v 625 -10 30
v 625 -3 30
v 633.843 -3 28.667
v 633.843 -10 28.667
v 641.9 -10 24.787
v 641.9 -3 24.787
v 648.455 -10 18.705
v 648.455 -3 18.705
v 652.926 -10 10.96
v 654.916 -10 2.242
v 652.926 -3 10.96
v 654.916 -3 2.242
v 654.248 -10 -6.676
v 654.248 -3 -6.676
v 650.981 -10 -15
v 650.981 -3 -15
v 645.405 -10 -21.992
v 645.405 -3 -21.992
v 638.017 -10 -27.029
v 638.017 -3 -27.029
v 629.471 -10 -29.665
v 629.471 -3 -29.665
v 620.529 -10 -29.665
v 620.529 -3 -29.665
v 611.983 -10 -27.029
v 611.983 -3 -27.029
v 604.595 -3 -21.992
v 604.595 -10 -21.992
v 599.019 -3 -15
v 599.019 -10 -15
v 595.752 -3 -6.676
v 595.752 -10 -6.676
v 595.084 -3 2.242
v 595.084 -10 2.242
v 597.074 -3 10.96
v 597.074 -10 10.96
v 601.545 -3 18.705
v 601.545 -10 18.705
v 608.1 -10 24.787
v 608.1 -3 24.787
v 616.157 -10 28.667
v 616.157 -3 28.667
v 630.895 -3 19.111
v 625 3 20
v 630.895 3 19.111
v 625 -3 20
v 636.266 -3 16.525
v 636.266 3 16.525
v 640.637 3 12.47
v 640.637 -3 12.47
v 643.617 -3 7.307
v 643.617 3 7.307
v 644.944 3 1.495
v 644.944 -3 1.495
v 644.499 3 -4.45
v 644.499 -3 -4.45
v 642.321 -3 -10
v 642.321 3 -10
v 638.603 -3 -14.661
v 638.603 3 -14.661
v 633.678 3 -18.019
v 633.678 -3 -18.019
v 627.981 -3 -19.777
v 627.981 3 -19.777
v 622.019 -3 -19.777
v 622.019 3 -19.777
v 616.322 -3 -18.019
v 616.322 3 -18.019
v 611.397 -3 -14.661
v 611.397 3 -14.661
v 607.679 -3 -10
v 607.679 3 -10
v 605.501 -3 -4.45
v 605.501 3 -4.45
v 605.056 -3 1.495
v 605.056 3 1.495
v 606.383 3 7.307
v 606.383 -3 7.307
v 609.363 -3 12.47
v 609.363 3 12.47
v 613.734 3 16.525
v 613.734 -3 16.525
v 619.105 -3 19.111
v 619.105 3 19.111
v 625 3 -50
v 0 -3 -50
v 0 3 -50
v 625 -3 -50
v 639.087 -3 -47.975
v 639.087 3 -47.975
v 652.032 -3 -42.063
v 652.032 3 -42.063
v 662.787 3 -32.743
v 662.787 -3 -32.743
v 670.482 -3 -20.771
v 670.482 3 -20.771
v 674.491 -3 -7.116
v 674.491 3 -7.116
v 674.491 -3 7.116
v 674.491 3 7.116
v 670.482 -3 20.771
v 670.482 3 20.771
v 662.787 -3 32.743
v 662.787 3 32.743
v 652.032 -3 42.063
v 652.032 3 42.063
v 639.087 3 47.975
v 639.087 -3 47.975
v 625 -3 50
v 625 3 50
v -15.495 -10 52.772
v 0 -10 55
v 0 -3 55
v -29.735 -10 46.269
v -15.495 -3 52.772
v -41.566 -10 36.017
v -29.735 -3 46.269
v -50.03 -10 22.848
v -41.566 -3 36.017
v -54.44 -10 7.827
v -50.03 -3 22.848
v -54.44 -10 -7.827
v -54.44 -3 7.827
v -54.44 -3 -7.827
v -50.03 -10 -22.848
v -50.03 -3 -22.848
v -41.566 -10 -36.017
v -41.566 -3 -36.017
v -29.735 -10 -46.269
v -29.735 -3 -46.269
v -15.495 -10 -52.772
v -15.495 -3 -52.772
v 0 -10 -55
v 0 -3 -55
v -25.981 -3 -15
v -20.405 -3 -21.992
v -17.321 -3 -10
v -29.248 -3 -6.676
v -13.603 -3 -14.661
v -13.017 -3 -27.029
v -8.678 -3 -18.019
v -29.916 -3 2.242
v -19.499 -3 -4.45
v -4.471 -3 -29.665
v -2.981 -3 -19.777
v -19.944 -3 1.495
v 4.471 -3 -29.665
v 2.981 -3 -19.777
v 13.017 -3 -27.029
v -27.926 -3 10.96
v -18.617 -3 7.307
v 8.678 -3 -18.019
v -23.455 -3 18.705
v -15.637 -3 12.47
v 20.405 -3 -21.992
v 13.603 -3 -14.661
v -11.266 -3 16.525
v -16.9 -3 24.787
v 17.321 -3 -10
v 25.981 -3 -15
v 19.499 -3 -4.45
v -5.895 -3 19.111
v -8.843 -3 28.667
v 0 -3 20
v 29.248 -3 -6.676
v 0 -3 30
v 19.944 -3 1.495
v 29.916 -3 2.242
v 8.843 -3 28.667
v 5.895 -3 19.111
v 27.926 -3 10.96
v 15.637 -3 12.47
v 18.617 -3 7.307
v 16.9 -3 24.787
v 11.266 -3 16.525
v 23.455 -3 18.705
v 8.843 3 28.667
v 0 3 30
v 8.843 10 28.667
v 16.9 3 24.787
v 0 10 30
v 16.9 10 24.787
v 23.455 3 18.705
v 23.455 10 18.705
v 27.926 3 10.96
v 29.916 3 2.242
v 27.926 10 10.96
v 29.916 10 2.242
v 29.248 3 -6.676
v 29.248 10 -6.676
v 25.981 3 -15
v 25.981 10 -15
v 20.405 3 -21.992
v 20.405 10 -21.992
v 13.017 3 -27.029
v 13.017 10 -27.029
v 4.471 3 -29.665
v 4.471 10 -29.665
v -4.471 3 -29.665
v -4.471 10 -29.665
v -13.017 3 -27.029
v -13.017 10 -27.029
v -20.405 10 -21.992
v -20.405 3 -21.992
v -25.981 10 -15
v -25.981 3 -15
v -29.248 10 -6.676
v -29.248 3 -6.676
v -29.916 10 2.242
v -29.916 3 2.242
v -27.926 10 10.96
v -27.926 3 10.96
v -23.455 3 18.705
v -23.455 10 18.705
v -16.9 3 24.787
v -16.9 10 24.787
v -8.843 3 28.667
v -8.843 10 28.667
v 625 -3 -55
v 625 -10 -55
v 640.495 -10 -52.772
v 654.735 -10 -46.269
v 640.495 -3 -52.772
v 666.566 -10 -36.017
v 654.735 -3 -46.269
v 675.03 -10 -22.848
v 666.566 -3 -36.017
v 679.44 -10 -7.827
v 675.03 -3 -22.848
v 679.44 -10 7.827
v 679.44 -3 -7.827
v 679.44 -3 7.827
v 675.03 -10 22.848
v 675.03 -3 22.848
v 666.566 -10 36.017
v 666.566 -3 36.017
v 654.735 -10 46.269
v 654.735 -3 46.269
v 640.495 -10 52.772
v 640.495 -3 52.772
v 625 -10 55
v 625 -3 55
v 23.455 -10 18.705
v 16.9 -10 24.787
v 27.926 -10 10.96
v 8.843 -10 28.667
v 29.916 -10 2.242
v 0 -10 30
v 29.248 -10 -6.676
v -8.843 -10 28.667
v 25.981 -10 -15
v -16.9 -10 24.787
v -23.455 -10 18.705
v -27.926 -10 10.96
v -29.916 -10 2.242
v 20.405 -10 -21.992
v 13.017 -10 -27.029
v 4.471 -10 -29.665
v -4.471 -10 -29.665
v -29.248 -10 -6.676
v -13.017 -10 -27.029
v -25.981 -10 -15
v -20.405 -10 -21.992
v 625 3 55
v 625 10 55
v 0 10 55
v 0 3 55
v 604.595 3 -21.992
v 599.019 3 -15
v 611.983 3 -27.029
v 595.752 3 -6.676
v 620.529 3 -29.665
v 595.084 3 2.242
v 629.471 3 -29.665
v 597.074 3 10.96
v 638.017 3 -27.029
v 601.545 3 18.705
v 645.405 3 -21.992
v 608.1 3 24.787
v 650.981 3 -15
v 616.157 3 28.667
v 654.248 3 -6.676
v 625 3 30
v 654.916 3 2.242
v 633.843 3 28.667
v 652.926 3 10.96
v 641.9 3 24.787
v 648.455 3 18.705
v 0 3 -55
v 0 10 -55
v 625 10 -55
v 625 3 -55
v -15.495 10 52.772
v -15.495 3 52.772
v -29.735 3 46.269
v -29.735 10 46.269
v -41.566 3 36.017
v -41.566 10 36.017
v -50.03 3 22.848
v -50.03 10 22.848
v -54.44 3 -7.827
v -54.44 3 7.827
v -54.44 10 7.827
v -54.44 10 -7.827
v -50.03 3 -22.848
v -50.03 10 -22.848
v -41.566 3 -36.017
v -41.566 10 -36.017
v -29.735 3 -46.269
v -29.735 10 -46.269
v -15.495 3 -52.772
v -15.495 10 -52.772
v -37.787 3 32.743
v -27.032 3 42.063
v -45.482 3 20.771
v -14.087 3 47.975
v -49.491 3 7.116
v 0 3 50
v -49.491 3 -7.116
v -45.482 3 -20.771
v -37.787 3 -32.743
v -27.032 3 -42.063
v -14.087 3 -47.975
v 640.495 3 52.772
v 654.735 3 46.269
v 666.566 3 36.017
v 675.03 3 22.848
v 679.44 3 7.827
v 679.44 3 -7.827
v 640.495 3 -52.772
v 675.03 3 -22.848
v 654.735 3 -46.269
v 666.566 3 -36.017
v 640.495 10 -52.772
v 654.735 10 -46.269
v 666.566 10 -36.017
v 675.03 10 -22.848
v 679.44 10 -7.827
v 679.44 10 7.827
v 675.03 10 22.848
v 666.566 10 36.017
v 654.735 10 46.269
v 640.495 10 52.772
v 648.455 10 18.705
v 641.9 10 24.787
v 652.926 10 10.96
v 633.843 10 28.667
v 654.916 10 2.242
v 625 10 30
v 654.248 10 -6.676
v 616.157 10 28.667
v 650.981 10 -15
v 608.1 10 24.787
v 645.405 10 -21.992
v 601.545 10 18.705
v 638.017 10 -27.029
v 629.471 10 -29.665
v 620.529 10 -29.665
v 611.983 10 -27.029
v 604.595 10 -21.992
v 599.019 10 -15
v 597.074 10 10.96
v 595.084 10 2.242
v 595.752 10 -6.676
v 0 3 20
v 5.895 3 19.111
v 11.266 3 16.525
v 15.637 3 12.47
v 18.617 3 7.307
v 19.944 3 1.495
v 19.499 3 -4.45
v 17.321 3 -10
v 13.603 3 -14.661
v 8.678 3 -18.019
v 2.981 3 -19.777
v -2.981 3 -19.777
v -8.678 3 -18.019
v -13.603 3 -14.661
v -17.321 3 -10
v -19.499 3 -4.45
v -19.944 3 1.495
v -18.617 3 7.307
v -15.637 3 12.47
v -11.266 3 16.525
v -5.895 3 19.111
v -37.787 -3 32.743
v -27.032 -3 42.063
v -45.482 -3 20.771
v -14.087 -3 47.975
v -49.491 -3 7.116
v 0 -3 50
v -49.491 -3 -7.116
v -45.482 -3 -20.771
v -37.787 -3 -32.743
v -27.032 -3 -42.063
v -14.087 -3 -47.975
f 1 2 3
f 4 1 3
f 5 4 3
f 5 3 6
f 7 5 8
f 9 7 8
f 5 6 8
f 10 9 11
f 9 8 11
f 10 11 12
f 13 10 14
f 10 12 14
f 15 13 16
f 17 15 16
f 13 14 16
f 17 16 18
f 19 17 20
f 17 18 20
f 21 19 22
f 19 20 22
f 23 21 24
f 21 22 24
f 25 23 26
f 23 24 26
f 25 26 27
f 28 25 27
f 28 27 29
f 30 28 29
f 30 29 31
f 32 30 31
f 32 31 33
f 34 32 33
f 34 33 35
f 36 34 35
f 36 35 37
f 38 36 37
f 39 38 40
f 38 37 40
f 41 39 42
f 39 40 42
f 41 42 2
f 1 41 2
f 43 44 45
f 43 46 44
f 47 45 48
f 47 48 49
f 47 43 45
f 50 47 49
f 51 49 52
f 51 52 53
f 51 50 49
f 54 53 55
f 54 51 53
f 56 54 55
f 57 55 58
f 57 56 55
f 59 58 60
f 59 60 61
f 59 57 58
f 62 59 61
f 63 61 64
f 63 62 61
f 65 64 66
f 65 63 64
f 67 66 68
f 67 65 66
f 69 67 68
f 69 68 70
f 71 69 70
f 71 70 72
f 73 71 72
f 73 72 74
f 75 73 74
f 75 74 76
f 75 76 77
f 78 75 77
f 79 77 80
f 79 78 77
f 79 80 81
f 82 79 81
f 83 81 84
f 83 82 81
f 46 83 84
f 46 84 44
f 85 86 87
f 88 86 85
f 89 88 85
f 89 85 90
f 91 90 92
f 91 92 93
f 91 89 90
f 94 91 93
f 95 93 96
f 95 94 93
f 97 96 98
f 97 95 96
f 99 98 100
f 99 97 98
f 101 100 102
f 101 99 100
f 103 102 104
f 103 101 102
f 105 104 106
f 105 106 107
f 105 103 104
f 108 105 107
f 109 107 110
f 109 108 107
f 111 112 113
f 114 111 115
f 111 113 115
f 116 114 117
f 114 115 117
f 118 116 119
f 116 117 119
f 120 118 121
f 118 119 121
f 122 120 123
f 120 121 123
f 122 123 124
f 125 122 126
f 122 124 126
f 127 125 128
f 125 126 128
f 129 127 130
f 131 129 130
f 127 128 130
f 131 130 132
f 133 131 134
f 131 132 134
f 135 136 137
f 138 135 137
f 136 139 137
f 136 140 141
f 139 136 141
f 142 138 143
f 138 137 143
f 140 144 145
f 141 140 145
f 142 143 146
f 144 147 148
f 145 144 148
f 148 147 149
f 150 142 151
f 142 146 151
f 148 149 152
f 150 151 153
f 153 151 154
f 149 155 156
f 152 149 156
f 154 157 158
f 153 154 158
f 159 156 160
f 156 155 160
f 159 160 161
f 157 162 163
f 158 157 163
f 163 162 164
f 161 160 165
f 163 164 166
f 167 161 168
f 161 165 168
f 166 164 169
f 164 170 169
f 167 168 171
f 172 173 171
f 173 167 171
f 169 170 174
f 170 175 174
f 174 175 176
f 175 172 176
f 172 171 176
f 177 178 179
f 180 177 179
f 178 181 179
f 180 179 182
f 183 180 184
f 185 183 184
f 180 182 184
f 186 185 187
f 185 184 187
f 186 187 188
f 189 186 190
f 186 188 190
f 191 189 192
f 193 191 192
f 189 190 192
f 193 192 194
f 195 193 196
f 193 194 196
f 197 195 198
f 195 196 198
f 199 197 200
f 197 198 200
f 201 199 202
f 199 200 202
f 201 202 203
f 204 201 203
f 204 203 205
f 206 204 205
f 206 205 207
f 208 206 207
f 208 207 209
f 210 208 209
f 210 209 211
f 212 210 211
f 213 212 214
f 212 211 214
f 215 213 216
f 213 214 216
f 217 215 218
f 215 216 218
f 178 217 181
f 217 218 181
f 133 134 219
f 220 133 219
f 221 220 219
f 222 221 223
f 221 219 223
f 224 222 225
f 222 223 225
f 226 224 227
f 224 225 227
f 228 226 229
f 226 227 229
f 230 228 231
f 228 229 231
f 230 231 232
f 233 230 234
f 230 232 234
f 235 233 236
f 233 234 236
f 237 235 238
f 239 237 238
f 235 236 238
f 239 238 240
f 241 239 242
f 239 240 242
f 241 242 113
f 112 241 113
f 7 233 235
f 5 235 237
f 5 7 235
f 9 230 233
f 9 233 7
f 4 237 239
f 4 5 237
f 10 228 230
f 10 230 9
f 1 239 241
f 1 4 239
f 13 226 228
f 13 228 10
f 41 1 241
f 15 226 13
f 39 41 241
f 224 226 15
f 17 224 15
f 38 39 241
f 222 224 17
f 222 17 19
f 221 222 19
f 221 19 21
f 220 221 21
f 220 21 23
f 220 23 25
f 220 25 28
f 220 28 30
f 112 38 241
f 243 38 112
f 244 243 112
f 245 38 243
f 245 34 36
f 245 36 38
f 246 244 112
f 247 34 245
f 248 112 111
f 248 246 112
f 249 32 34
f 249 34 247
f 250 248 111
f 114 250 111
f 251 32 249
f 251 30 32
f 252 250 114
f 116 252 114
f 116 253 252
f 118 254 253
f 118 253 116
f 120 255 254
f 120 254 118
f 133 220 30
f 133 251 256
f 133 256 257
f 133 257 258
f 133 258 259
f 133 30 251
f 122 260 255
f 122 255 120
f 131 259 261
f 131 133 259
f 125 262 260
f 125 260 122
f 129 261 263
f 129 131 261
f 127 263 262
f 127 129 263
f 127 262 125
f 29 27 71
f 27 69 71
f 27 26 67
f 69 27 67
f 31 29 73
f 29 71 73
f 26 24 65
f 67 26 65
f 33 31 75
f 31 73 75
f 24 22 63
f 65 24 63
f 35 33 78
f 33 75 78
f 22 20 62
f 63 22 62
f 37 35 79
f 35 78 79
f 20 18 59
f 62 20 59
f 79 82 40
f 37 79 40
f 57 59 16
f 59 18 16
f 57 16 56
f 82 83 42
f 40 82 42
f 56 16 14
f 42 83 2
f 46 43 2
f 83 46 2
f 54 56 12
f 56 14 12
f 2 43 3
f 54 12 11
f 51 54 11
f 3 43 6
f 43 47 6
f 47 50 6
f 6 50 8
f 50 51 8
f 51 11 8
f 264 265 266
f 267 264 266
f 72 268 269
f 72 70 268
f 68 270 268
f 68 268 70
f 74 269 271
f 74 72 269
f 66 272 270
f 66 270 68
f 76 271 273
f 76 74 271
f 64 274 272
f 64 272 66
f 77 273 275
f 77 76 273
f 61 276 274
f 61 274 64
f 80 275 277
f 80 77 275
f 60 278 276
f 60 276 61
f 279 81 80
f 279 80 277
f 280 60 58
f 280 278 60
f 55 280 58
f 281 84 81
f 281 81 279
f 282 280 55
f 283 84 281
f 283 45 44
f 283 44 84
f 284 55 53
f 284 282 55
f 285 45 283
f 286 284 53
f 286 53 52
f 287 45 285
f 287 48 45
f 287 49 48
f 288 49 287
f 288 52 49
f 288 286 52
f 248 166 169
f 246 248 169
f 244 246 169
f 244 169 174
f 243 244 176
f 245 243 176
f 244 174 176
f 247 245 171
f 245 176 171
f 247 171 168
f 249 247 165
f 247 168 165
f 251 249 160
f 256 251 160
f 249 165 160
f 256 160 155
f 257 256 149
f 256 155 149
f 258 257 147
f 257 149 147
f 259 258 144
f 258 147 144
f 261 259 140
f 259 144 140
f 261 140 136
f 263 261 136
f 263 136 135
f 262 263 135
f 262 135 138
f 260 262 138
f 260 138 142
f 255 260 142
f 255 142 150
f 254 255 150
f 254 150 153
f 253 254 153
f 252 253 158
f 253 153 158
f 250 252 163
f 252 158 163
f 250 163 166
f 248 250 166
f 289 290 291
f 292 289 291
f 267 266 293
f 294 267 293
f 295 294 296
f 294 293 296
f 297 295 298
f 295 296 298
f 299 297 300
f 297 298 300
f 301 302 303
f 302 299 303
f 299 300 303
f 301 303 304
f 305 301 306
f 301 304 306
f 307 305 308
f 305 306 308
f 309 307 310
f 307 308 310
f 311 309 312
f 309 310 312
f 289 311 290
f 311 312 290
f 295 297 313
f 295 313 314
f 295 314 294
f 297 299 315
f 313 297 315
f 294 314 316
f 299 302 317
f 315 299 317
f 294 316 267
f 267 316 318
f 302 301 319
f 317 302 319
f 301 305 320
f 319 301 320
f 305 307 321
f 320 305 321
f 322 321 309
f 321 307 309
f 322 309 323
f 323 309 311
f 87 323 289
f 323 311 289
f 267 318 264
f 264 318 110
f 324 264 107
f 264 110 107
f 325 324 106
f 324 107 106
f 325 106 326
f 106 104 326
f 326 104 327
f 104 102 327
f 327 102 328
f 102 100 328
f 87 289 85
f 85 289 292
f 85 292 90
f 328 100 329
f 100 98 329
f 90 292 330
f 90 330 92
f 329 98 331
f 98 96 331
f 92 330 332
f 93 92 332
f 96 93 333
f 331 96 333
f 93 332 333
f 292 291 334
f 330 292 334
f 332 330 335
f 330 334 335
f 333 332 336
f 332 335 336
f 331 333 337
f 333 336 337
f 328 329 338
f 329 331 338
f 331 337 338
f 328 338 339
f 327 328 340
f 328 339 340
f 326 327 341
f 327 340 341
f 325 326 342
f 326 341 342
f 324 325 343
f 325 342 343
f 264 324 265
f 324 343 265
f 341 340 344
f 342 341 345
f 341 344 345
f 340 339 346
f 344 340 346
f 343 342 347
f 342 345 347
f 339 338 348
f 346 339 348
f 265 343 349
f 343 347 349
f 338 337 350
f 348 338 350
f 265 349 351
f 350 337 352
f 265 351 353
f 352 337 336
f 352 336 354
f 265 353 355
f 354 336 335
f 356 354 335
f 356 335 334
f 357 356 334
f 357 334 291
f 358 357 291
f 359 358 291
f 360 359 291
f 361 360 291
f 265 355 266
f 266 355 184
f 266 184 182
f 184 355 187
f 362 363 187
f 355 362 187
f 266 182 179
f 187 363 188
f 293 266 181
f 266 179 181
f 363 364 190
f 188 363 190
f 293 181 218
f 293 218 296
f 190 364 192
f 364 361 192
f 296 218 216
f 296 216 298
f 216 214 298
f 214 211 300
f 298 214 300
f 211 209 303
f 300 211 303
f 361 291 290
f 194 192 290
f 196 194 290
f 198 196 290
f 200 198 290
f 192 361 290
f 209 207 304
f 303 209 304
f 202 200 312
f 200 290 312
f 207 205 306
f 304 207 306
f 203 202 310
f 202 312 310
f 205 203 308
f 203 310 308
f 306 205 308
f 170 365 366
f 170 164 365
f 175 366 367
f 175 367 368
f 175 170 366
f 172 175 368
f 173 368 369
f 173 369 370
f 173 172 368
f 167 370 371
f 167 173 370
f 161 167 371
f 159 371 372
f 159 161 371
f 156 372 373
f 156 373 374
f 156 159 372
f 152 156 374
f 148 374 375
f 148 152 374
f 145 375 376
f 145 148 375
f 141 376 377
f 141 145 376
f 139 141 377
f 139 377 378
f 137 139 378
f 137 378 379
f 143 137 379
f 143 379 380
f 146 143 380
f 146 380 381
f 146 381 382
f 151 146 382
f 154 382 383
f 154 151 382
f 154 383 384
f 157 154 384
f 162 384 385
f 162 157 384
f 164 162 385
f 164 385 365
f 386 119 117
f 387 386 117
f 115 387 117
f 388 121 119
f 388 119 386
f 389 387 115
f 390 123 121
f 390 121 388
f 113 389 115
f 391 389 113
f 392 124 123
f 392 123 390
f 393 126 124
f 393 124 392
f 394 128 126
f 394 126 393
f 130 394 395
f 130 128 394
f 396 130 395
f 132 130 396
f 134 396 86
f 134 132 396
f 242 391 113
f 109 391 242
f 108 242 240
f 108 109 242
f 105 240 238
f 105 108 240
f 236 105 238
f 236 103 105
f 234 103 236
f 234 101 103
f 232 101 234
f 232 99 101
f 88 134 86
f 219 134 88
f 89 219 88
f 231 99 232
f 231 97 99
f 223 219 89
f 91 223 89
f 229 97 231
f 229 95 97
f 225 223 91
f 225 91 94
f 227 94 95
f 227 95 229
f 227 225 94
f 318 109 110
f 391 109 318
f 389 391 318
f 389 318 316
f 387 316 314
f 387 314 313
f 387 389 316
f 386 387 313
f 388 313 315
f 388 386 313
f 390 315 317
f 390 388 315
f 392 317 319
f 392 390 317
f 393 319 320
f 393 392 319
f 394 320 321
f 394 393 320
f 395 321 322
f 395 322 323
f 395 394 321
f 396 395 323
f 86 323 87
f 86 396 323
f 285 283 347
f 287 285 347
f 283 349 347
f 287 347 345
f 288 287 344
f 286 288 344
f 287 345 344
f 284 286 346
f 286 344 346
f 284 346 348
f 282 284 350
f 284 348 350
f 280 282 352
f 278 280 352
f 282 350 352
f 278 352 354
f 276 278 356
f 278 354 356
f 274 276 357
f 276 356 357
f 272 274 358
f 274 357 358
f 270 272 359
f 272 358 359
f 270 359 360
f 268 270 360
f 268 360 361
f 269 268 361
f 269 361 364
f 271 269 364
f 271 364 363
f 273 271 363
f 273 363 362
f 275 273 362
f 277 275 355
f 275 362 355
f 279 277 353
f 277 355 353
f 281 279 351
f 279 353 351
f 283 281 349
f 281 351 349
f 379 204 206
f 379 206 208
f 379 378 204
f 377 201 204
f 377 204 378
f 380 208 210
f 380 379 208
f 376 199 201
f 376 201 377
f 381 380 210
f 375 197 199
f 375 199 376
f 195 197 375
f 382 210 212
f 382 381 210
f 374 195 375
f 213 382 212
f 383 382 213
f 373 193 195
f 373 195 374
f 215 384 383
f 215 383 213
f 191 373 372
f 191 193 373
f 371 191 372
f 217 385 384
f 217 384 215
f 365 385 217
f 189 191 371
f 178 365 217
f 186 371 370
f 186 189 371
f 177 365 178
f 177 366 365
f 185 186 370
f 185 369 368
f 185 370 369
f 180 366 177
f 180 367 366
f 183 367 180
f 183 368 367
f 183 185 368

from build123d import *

# Parameters (mm, degrees)
BOSS_EXTRUDE1_DEPTH = 10
SKETCH1_3_OUTSIDE_W = 885.69
SKETCH1_3_OUTSIDE_H = 260.69
SKETCH1_3_OUTSIDE_R = 30
CUT_EXTRUDE1_DEPTH  = 3
SKETCH1_5_R         = 30
CUT_EXTRUDE3_DEPTH  = 10
SKETCH1_6_R         = 30
SKETCH1_6_R_2       = 20
BOSS_EXTRUDE2_DEPTH = 3
SKETCH1_7_R         = 30
CUT_EXTRUDE4_DEPTH  = 10
SKETCH1_8_R         = 30
SKETCH1_8_R_2       = 20
BOSS_EXTRUDE3_DEPTH = 3


with BuildPart() as part:
    # Sketch1 → Boss-Extrude1 (new, symmetric)
    with BuildSketch(Plane(origin=(0, 0, 0), x_dir=(1, 0, 0), z_dir=(0, 1, 0))):
        with BuildLine():
            Line((0, 55), (625, 55))
            ThreePointArc((625, 55), (680, 0), (625, -55))
            Line((625, -55), (0, -55))
            ThreePointArc((0, -55), (-55, 0), (0, 55))
        make_face()
    extrude(amount=BOSS_EXTRUDE1_DEPTH, both=True)

    # Sketch1<3> outside → Cut-Extrude1 (cut, symmetric)
    # profile 1 of 3: a face of its own
    with BuildSketch(Plane(origin=(0, 0, 0), x_dir=(1, 0, 0), z_dir=(0, 1, 0))):
        with Locations((312.5, 0)):
            Rectangle(SKETCH1_3_OUTSIDE_W, SKETCH1_3_OUTSIDE_H)
        with BuildLine():
            Line((0, 50), (625, 50))
            ThreePointArc((625, 50), (675, 0), (625, -50))
            Line((625, -50), (0, -50))
            ThreePointArc((0, -50), (-50, 0), (0, 50))
        make_face(mode=Mode.SUBTRACT)
    # profile 2 of 3: a face of its own
    with BuildSketch(Plane(origin=(0, 0, 0), x_dir=(1, 0, 0), z_dir=(0, 1, 0))):
        with Locations(Location((0, 0, 0), (0, 0, 270))):
            Circle(SKETCH1_3_OUTSIDE_R)
    # profile 3 of 3: a face of its own
    with BuildSketch(Plane(origin=(0, 0, 0), x_dir=(1, 0, 0), z_dir=(0, 1, 0))):
        with Locations(Location((625, 0, 0), (0, 0, 270))):
            Circle(SKETCH1_3_OUTSIDE_R)
    extrude(amount=CUT_EXTRUDE1_DEPTH, both=True, mode=Mode.SUBTRACT)

    # Sketch1<5> → Cut-Extrude3 (cut, symmetric)
    with BuildSketch(Plane(origin=(0, 0, 0), x_dir=(1, 0, 0), z_dir=(0, 1, 0))):
        with Locations(Location((625, 0, 0), (0, 0, 270))):
            Circle(SKETCH1_5_R)
    extrude(amount=CUT_EXTRUDE3_DEPTH, both=True, mode=Mode.SUBTRACT)

    # Sketch1<6> → Boss-Extrude2 (add, symmetric)
    with BuildSketch(Plane(origin=(0, 0, 0), x_dir=(1, 0, 0), z_dir=(0, 1, 0))):
        with Locations(Location((625, 0, 0), (0, 0, 270))):
            Circle(SKETCH1_6_R)
        with Locations(Location((625, 0, 0), (0, 0, 270))):
            Circle(SKETCH1_6_R_2, mode=Mode.SUBTRACT)
    extrude(amount=BOSS_EXTRUDE2_DEPTH, both=True)

    # Sketch1<7> → Cut-Extrude4 (cut, symmetric)
    with BuildSketch(Plane(origin=(0, 0, 0), x_dir=(1, 0, 0), z_dir=(0, 1, 0))):
        with Locations(Location((0, 0, 0), (0, 0, 270))):
            Circle(SKETCH1_7_R)
    extrude(amount=CUT_EXTRUDE4_DEPTH, both=True, mode=Mode.SUBTRACT)

    # Sketch1<8> → Boss-Extrude3 (add, symmetric)
    with BuildSketch(Plane(origin=(0, 0, 0), x_dir=(1, 0, 0), z_dir=(0, 1, 0))):
        with Locations(Location((0, 0, 0), (0, 0, 270))):
            Circle(SKETCH1_8_R)
        with Locations(Location((0, 0, 0), (0, 0, 270))):
            Circle(SKETCH1_8_R_2, mode=Mode.SUBTRACT)
    extrude(amount=BOSS_EXTRUDE3_DEPTH, both=True)


solid = part.part
